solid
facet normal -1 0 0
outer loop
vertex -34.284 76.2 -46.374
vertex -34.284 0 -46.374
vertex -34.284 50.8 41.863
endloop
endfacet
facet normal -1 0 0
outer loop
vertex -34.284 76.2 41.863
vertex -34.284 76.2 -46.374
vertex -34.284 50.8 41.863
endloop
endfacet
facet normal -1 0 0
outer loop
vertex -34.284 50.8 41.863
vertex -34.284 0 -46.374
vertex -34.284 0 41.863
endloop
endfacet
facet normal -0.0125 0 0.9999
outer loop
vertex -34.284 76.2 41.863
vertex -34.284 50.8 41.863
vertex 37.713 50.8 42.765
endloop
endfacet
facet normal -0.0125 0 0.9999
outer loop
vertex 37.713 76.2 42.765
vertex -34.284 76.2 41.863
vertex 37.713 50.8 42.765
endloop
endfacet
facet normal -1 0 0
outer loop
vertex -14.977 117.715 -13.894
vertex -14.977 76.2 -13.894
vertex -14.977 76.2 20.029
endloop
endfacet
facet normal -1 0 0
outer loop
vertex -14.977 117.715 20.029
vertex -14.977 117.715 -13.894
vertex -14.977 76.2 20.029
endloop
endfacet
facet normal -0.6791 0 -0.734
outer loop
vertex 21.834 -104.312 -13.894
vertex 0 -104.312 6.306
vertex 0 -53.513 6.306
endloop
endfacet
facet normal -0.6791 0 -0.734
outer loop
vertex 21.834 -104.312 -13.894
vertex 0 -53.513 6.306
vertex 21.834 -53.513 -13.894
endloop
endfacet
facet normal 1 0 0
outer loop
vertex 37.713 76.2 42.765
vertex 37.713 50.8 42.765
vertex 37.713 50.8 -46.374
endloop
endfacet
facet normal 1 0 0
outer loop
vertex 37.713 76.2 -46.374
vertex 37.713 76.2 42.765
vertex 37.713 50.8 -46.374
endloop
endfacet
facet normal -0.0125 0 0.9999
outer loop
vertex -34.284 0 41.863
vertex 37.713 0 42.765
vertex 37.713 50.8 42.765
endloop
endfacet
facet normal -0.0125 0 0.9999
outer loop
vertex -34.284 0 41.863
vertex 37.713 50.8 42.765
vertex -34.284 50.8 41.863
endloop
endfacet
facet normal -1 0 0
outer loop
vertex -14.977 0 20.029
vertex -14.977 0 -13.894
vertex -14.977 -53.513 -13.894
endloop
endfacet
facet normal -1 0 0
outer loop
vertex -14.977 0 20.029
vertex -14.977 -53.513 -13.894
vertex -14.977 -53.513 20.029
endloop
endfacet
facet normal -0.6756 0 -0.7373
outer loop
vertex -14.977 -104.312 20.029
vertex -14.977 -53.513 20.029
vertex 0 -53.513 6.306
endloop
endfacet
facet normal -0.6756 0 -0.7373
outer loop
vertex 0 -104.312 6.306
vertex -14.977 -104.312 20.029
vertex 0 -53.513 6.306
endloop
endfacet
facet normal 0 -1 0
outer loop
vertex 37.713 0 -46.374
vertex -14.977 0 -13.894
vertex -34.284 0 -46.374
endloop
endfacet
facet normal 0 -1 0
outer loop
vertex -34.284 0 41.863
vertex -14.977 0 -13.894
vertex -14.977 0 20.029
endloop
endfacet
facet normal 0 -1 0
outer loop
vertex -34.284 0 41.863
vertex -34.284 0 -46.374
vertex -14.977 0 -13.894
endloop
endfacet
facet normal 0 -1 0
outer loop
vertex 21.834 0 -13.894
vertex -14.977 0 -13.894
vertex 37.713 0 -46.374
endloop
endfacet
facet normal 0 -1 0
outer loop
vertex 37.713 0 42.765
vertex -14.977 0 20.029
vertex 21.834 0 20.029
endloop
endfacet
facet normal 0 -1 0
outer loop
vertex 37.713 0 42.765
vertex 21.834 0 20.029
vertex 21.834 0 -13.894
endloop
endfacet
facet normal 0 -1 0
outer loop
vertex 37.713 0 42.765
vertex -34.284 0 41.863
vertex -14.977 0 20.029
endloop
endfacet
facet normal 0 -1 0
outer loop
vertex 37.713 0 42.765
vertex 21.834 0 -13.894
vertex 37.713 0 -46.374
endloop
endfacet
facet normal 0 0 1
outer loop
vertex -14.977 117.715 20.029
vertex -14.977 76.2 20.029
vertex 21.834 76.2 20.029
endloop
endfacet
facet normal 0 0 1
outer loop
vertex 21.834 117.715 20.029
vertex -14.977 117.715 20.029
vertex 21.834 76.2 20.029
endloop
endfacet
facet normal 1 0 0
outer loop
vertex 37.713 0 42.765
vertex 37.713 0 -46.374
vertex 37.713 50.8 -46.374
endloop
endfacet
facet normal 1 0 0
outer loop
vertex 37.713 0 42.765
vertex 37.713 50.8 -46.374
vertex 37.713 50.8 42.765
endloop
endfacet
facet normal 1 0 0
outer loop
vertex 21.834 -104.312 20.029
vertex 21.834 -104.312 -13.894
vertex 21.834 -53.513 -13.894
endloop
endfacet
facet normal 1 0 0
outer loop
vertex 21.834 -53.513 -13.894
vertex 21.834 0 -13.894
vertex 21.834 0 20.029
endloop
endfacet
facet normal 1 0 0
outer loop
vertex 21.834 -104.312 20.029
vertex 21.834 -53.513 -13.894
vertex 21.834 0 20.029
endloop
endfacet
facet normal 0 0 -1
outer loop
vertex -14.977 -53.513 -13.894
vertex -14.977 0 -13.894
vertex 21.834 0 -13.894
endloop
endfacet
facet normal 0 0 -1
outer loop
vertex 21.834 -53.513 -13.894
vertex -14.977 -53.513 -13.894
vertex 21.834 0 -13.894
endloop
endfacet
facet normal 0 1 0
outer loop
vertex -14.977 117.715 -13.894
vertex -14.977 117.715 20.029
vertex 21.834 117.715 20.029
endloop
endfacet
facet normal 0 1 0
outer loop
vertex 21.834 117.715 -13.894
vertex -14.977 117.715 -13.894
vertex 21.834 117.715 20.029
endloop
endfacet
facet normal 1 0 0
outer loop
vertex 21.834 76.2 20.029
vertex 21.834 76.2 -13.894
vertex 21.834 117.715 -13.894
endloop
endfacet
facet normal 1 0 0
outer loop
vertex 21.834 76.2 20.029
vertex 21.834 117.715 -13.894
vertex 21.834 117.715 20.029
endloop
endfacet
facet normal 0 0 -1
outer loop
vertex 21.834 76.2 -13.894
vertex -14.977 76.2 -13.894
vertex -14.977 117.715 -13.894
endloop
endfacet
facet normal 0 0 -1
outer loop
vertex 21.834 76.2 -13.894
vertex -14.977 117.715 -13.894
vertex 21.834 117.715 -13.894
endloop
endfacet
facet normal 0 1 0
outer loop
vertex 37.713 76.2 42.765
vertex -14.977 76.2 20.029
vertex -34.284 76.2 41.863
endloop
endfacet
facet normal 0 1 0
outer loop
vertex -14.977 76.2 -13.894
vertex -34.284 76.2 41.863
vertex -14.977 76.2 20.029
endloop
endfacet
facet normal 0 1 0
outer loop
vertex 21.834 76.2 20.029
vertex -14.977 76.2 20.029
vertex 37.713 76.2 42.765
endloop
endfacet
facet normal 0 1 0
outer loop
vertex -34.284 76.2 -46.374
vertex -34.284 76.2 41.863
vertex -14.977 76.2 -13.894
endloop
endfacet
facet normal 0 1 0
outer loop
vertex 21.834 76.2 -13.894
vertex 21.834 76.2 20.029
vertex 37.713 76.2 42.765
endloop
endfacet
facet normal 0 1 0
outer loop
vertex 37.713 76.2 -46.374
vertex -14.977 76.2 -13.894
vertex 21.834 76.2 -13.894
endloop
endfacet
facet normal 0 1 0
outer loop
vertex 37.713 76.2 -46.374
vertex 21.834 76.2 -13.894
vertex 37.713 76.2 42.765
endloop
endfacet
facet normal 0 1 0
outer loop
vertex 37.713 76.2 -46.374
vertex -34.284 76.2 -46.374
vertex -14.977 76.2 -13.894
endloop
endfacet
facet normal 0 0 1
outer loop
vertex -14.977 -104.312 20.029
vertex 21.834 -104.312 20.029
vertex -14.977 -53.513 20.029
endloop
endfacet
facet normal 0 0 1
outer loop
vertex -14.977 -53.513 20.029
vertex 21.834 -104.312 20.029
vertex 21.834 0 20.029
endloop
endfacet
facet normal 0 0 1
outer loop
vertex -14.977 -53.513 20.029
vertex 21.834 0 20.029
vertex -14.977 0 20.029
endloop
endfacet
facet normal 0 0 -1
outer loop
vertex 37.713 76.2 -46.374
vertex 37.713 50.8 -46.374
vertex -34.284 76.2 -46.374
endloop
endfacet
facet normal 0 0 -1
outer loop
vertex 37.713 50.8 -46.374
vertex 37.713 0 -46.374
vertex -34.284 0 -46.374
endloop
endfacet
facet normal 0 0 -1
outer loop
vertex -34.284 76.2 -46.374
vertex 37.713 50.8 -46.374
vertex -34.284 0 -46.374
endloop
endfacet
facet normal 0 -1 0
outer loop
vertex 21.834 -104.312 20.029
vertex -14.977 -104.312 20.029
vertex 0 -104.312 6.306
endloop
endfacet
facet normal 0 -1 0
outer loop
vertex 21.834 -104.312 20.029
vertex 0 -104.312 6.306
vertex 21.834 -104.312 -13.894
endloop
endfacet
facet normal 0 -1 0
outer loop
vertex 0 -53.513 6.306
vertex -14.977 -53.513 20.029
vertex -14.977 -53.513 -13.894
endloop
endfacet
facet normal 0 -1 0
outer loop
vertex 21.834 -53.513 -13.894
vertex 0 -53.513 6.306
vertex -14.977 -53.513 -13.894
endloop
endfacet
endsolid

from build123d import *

# Parameters (mm, degrees)
F1_DEPTH = 50.8
F2_DEPTH = 25.4
F4_W     = 36.810688
F4_H     = 33.923566
F6_DEPTH = 117.714763
F7_DEPTH = 53.512752
F9_DEPTH = 50.799541


with BuildPart() as f1:
    # F0 (on Front) → F1 (new body)
    with BuildSketch(Plane.XZ):
        Polygon((37.712902, 42.765312), (-34.284458, 41.863091), (-34.284458, -46.374276), (37.712902, -46.374276), align=None)
    extrude(amount=-F1_DEPTH)

    # F1_face (on face) → F2 (join)
    with BuildSketch(Plane(origin=(1.775257, 50.8, -2.029655), x_dir=(1, 0, 0), z_dir=(0, 1, 0))):
        Polygon((-36.059715, -43.892746), (35.937644, -44.794967), (35.937644, 44.344621), (-36.059715, 44.344621), align=None)
    extrude(amount=F2_DEPTH)

    # F4 (on face) → F6 (join)
    with BuildSketch(Plane.XZ):
        with Locations((3.428448, 3.067523)):
            Rectangle(F4_W, F4_H)
    extrude(amount=-F6_DEPTH)

    # F4 (on face) → F7 (join)
    with BuildSketch(Plane.XZ):
        with Locations((3.428448, 3.067523)):
            Rectangle(F4_W, F4_H)
    extrude(amount=F7_DEPTH)

    # F8 (on face) → F9 (join)
    with BuildSketch(Plane.XZ.offset(53.512752)):
        Polygon((-14.976896, 20.029306), (0, 6.306419), (21.833792, -13.89426), (21.833792, 20.029306), align=None)
    extrude(amount=F9_DEPTH)


solid = f1.part
